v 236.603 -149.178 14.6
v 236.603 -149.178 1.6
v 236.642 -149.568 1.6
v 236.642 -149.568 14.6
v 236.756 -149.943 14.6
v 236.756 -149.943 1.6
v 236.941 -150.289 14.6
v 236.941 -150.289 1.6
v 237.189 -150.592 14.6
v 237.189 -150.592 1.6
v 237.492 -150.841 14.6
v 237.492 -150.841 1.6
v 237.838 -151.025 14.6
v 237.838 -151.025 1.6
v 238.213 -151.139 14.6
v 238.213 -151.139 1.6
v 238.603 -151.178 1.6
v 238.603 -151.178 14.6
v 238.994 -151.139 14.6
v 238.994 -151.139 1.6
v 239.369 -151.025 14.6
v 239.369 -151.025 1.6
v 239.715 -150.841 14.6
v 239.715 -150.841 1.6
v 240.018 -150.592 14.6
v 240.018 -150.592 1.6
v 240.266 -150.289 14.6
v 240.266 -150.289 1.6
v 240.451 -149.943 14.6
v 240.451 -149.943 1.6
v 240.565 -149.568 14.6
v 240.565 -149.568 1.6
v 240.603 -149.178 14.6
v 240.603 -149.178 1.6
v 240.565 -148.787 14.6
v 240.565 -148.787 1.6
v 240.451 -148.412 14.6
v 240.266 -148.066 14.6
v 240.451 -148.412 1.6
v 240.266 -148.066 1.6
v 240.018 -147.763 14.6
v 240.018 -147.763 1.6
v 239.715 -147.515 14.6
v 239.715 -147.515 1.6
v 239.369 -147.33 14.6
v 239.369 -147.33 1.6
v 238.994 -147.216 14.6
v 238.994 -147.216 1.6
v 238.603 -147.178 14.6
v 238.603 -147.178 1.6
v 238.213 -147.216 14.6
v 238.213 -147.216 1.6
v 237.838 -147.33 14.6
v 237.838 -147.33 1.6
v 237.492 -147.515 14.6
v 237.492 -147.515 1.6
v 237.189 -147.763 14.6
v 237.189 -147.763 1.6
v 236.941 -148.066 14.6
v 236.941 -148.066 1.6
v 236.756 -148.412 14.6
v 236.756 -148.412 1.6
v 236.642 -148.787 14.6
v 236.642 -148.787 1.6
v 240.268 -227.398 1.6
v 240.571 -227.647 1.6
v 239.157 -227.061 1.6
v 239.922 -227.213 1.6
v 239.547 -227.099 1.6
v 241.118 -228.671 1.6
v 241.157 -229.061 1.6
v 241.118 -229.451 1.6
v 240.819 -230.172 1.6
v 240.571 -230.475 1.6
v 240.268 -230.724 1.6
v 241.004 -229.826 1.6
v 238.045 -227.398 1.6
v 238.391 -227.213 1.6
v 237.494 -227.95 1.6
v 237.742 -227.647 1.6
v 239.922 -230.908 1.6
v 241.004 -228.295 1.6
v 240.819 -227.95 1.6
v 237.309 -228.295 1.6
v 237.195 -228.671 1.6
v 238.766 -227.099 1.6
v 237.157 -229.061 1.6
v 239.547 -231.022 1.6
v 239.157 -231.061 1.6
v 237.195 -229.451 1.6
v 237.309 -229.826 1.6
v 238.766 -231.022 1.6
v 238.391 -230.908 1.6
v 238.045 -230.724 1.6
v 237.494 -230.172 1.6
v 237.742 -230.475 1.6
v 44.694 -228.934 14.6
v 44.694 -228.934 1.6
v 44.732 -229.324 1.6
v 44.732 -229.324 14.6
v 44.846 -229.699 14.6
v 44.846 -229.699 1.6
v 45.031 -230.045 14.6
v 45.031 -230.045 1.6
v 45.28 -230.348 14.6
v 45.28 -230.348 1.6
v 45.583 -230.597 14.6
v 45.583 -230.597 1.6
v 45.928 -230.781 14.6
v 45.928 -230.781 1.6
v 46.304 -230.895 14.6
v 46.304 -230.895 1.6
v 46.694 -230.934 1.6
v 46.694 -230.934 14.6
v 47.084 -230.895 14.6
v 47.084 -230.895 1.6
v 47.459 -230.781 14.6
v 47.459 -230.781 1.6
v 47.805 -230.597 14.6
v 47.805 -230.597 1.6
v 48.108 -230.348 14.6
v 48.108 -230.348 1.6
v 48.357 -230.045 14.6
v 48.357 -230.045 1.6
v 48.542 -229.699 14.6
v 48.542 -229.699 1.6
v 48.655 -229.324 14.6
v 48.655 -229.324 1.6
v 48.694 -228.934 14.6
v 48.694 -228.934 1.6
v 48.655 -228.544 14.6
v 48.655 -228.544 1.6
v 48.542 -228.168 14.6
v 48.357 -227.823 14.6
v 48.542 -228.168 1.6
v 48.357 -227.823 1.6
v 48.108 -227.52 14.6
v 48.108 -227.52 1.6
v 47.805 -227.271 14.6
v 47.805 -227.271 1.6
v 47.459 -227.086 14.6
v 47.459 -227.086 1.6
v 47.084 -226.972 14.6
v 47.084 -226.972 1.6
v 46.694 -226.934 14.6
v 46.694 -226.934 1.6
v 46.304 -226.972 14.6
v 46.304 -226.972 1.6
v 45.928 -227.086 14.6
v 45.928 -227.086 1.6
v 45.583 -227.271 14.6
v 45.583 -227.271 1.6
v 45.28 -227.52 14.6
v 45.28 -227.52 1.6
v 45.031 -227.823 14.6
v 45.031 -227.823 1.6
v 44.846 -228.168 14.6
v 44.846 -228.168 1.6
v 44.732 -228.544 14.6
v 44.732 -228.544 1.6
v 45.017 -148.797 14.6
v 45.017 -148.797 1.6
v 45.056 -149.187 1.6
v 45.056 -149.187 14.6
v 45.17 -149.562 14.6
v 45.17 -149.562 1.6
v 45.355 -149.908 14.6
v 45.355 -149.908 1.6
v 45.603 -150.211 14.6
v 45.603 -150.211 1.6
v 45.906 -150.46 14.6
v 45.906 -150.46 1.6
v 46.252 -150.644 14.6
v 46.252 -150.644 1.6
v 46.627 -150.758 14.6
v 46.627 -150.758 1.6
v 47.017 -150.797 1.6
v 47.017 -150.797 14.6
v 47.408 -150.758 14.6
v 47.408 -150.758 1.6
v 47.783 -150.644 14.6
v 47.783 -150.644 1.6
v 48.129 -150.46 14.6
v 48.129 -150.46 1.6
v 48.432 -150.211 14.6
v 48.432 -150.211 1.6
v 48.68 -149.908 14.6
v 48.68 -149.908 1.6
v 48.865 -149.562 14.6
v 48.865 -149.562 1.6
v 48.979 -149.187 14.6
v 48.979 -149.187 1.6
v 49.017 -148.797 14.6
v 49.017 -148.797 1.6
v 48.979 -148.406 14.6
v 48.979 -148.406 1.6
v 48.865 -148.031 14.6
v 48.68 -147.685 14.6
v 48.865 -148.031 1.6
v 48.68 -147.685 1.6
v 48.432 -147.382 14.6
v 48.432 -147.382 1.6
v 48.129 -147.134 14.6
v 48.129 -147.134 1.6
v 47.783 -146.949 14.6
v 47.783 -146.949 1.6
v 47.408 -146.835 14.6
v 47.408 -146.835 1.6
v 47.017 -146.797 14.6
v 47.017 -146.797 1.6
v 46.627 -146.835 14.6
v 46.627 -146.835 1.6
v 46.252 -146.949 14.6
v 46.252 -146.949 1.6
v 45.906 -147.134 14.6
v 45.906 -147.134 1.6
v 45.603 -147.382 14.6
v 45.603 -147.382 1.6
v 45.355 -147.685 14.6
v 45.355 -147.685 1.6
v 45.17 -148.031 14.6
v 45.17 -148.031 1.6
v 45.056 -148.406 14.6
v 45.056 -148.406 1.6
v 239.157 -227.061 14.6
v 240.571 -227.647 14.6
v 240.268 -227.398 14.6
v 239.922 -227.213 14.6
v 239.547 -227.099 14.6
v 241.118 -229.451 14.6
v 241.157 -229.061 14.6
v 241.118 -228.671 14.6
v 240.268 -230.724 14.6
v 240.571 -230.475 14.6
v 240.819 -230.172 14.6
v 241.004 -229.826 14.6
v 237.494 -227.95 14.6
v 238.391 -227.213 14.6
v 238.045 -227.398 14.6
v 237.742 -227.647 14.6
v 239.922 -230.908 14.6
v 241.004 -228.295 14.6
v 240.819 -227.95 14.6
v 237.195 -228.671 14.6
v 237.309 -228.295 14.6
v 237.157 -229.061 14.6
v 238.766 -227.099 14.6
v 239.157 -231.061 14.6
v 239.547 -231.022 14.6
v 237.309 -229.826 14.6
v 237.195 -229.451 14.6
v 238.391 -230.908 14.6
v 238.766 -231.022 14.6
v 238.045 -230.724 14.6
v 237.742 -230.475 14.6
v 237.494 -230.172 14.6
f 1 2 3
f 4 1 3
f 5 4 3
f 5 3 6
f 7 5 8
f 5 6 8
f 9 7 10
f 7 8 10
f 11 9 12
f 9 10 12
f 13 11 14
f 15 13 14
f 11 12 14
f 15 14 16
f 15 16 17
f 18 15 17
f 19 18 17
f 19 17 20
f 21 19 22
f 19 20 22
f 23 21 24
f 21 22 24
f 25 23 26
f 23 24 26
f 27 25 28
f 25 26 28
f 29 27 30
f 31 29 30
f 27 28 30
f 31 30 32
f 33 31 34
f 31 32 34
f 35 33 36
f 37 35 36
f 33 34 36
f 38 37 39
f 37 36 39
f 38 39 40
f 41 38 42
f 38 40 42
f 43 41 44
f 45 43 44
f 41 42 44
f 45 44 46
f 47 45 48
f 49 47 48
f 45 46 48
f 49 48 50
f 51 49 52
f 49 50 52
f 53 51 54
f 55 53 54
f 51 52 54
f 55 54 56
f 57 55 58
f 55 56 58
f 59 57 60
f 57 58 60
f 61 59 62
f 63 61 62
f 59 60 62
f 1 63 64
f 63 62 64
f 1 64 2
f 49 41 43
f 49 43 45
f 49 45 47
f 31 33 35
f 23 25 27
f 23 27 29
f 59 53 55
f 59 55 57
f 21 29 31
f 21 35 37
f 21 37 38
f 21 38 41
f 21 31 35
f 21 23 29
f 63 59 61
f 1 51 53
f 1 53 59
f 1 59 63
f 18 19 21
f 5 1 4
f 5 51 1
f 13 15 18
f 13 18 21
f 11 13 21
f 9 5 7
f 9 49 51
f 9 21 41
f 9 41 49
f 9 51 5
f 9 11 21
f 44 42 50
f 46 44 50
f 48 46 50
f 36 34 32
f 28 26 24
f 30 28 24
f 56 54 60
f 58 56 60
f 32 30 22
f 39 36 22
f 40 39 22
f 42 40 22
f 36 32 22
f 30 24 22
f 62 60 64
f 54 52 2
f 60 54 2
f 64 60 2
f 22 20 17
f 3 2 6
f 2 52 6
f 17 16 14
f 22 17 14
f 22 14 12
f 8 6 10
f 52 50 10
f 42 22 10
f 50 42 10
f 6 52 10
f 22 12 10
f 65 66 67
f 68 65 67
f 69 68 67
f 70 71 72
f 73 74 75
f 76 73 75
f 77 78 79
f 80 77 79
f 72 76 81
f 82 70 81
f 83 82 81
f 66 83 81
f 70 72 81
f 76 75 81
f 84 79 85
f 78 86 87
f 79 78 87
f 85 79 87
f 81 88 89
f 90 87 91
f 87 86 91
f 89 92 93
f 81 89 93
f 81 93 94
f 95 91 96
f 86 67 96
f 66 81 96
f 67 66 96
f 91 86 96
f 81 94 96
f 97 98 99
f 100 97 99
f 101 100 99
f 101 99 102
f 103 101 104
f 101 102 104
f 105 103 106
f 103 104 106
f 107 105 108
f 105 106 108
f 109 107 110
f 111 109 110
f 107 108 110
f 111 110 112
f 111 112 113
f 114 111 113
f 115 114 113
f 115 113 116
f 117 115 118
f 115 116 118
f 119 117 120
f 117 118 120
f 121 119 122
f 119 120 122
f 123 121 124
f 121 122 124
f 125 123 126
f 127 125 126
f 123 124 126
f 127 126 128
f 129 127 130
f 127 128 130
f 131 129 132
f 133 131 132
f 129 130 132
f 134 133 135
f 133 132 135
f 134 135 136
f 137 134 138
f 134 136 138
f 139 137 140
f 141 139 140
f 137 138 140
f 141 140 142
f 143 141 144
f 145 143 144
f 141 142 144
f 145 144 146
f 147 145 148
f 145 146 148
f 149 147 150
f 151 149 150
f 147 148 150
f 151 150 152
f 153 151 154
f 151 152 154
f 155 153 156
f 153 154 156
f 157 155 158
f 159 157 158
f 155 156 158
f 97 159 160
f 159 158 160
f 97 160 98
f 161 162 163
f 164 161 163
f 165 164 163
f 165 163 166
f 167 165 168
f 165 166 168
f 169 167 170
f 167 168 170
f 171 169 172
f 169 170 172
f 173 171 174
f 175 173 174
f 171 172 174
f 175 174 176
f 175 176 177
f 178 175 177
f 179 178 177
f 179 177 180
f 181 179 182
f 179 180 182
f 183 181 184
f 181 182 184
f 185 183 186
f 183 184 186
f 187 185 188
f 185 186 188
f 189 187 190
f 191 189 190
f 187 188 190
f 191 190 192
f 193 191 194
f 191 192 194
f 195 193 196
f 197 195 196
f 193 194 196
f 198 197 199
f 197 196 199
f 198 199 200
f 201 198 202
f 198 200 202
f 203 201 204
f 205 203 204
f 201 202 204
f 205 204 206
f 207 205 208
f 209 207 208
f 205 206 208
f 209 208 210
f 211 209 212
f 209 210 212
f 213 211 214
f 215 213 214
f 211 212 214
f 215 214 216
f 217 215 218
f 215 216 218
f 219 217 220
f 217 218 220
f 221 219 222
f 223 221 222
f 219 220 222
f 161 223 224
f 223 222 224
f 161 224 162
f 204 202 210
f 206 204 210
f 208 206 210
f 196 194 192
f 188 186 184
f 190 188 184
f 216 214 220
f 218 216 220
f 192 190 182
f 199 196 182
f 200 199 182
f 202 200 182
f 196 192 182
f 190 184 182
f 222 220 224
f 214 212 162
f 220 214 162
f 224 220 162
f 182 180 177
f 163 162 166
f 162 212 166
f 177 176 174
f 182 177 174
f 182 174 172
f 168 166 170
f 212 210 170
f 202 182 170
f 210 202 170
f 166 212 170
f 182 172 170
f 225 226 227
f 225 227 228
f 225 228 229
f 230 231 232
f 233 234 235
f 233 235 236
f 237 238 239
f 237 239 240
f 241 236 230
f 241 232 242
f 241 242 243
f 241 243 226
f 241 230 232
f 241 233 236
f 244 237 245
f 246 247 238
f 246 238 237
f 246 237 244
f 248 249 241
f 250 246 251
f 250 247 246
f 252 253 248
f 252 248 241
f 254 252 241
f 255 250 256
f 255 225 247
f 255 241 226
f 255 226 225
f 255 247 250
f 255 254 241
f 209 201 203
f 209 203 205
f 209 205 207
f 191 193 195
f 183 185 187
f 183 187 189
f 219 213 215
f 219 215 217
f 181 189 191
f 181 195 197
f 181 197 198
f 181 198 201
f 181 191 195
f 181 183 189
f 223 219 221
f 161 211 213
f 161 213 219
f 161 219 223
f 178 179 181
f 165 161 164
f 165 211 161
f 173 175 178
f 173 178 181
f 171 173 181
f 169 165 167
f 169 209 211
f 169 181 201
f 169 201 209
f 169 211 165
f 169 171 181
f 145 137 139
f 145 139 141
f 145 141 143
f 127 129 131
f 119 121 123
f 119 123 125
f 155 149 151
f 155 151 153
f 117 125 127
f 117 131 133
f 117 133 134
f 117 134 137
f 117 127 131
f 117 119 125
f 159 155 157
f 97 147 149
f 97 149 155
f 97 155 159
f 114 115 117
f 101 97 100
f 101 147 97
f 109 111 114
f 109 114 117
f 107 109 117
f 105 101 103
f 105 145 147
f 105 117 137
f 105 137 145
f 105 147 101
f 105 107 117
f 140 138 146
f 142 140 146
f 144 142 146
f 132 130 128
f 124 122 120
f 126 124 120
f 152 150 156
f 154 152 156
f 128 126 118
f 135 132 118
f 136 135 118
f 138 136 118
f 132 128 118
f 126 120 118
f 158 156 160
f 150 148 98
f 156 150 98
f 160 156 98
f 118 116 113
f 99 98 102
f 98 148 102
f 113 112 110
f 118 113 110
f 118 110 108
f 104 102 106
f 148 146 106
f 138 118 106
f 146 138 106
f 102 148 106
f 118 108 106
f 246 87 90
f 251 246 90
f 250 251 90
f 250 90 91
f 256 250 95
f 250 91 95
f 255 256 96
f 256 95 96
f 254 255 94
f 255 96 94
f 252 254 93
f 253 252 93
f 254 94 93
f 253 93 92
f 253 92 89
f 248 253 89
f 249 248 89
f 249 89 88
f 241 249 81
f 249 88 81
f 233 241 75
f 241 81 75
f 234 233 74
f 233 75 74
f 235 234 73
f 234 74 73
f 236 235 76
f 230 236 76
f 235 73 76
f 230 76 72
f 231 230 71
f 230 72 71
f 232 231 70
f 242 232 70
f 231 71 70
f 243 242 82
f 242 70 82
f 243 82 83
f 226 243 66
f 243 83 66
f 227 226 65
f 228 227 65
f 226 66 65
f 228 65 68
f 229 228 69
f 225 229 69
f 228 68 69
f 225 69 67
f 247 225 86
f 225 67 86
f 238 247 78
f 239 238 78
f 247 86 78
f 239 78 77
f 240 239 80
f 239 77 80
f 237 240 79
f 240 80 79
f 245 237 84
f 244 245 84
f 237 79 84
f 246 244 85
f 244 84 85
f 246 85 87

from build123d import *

# Parameters (mm, degrees)
SKETCH_2_R        = 2
EXTRUDE_1_DEPTH   = 13
SKETCH_4_R        = 2
EXTRUDE_2_DEPTH   = 13
SKETCH_5_R        = 2
EXTRUDE_3_DEPTH   = 13
EXTRUDE_3_2_DEPTH = 13


with BuildPart() as part:
    # 草图2 → 凸台-拉伸1 (new body)
    with BuildSketch(Plane.XY.offset(1.6000508)):
        with Locations(Location((47.017442215, -148.796578613, 0), (0, 0, 180))):
            Circle(SKETCH_2_R)
    extrude(amount=EXTRUDE_1_DEPTH)


with BuildPart() as body_2:
    # 草图4 → 凸台-拉伸2 (new body)
    with BuildSketch(Plane.XY.offset(1.6000508)):
        with Locations(Location((238.603472187, -149.177579375, 0), (0, 0, 180))):
            Circle(SKETCH_4_R)
    extrude(amount=EXTRUDE_2_DEPTH)


with BuildPart() as body_3:
    # 草图5 → 凸台-拉伸3 (new body)
    with BuildSketch(Plane.XY.offset(1.6000508)):
        with Locations(Location((239.156530353, -229.060739141, 0), (0, 0, 180))):
            Circle(SKETCH_5_R)
    extrude(amount=EXTRUDE_3_DEPTH)


with BuildPart() as body_4:
    # 草图5 → Extrude 3 2 (new body)
    with BuildSketch(Plane.XY.offset(1.6000508)):
        with Locations(Location((46.693792228, -228.933738887, 0), (0, 0, 180))):
            Circle(SKETCH_5_R)
    extrude(amount=EXTRUDE_3_2_DEPTH)


solid = Compound([part.part, body_2.part, body_3.part, body_4.part])
